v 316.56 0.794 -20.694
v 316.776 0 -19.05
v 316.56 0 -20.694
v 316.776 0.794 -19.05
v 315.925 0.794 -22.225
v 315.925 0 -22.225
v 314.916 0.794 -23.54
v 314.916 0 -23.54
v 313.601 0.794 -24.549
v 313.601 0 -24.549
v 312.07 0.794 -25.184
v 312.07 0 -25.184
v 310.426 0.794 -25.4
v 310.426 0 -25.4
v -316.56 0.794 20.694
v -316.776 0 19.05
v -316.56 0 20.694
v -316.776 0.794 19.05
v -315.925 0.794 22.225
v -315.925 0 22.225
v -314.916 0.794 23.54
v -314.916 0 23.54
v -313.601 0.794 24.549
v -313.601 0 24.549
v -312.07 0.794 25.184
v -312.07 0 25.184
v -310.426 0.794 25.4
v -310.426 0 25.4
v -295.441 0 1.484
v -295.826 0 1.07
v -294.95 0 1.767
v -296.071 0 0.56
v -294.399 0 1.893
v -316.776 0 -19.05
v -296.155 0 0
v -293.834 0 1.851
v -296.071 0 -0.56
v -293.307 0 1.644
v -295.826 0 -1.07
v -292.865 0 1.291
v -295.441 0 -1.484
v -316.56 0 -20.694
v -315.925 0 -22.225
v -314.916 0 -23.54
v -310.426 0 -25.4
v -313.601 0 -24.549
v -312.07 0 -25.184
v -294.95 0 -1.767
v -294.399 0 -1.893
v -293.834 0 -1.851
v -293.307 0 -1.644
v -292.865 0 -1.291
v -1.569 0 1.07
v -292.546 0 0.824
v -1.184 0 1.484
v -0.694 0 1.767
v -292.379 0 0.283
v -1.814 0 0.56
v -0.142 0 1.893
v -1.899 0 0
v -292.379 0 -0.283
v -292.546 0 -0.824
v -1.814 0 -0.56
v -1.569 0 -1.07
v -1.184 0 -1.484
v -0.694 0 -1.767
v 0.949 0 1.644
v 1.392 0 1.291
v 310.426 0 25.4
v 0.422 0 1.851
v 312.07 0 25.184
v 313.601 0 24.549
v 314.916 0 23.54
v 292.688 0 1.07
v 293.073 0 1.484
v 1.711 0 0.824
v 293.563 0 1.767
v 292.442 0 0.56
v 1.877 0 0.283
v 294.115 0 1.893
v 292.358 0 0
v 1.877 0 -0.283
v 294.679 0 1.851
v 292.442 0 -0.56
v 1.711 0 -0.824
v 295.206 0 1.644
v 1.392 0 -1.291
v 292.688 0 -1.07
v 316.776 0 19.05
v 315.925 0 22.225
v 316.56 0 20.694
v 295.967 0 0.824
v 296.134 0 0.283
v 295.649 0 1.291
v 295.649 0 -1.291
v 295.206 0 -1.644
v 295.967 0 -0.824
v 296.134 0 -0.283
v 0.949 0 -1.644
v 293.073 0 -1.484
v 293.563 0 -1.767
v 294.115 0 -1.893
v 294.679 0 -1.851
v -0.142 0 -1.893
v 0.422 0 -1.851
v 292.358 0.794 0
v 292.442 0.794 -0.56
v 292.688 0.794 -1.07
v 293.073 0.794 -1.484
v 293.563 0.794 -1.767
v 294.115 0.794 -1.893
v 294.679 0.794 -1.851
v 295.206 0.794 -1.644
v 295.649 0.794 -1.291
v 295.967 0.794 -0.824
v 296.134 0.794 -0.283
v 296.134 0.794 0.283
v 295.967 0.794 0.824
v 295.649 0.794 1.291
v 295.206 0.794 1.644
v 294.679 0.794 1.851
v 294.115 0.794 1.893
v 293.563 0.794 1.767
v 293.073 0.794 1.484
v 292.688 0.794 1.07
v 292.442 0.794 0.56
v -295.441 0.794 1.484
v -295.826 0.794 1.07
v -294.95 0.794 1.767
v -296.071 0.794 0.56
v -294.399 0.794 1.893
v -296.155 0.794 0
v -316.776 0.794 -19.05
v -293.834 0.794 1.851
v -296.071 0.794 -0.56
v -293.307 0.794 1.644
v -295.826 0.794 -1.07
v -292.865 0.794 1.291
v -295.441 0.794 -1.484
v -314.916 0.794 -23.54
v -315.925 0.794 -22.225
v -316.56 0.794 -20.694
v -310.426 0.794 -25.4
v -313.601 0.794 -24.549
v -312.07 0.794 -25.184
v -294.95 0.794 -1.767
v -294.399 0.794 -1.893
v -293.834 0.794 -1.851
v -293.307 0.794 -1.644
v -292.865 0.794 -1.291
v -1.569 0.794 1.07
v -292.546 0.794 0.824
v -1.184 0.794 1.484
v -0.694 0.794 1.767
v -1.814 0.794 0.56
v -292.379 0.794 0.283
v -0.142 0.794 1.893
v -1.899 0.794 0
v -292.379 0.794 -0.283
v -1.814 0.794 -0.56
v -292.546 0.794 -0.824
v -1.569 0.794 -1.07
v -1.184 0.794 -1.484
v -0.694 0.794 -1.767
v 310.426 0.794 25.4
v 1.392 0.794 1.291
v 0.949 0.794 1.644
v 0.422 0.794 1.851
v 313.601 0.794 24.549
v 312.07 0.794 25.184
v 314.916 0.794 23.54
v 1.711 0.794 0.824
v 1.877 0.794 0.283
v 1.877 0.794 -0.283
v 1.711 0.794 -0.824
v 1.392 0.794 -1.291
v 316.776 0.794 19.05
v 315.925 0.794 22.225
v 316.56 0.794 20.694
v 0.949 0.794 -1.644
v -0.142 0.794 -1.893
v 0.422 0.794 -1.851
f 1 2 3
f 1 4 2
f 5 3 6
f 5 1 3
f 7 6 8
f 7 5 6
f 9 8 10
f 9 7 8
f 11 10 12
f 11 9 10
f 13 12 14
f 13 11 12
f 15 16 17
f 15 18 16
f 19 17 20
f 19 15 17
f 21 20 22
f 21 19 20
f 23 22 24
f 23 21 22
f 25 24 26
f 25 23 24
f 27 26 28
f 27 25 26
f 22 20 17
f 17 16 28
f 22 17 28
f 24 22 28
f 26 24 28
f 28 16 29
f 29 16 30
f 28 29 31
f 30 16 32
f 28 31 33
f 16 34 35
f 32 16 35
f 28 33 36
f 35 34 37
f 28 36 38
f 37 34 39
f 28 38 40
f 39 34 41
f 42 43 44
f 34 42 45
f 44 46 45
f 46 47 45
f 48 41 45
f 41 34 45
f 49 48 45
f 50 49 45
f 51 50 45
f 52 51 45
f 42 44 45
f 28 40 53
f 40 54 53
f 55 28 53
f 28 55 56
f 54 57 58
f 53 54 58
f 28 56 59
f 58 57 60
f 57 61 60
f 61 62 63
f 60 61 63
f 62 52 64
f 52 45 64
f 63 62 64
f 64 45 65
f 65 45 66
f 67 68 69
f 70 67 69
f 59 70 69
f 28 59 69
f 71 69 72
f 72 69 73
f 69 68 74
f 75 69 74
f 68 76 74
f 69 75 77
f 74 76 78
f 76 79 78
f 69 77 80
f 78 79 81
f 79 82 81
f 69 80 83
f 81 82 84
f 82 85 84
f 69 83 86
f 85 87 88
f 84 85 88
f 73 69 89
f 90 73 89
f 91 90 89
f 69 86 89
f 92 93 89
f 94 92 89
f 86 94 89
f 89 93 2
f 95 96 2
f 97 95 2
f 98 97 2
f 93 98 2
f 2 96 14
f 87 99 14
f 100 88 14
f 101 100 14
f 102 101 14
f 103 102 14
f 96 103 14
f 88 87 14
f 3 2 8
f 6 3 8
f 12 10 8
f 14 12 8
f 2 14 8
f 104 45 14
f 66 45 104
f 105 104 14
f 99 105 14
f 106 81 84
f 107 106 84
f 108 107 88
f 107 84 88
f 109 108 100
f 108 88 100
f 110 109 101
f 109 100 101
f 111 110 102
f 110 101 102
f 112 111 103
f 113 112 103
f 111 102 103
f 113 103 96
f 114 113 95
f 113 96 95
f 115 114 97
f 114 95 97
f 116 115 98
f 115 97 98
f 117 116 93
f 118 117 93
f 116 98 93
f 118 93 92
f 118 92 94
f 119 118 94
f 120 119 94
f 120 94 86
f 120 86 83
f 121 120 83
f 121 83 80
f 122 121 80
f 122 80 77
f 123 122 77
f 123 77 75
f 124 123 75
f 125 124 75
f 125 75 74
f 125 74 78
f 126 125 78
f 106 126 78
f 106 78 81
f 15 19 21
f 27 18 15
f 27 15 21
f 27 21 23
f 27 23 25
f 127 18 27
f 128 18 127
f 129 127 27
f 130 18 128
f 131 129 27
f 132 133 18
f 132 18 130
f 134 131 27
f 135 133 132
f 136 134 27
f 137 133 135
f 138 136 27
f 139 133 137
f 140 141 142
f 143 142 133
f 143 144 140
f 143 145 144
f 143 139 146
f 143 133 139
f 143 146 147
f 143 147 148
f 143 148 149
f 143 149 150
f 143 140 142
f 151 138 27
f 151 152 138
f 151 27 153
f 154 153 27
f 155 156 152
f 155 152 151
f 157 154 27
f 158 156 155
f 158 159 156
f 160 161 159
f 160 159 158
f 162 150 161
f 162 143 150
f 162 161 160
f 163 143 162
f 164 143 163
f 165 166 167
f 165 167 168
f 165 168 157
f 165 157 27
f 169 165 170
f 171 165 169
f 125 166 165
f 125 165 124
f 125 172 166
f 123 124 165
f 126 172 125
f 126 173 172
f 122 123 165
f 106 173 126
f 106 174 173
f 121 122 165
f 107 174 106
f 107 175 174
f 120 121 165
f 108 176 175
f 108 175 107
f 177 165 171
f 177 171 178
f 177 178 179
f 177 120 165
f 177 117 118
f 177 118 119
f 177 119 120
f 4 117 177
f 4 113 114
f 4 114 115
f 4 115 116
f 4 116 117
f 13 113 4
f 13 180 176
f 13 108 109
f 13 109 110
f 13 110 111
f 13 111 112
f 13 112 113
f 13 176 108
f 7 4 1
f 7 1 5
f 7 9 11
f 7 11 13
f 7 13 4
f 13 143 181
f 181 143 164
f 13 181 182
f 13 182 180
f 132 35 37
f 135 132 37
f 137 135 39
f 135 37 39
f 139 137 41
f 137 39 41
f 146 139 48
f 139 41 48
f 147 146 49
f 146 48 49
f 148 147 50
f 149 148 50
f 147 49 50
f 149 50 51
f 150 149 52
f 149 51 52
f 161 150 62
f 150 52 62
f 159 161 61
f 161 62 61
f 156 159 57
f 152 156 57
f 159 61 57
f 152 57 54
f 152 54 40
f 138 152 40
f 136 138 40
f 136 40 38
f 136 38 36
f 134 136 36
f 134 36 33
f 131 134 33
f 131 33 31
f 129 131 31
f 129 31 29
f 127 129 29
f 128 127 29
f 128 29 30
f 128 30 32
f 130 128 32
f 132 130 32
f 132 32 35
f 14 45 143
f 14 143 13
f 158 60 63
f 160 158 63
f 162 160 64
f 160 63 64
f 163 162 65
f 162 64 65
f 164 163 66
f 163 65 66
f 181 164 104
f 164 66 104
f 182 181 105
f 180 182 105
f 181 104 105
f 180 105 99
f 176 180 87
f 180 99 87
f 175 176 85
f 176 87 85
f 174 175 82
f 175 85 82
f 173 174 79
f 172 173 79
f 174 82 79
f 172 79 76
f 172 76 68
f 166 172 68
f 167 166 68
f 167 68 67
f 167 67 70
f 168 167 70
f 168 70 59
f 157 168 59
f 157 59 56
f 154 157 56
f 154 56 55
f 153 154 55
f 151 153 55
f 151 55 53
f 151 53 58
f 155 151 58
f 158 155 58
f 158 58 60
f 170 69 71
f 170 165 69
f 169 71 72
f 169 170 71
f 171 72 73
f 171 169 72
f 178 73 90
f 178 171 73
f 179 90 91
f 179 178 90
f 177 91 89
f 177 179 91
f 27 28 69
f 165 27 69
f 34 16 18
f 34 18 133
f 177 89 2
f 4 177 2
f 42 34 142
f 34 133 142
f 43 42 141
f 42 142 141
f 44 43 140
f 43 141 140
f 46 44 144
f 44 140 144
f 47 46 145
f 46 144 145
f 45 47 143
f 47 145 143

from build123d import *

# Parameters (mm, degrees)
SKETCH1_W             = 633.5522
SKETCH1_H             = 50.8
BOSS_EXTRUDE1_DEPTH   = 0.79375
FILLET1_R             = 6.35
F_6_CLEARANCE_HOLE1_D = 3.7973


with BuildPart() as part:
    # Sketch1 → Boss-Extrude1 (new body)
    with BuildSketch(Plane(origin=(0, 0, 0), x_dir=(1, 0, 0), z_dir=(0, 1, 0))):
        Rectangle(SKETCH1_W, SKETCH1_H)
    extrude(amount=BOSS_EXTRUDE1_DEPTH)

    # Fillet1
    fillet1_edges = [part.edges().sort_by_distance(p)[0] for p in [
        (316.7761, 0.396875, 25.4),
        (-316.7761, 0.396875, 25.4),
        (-316.7761, 0.396875, -25.4),
        (316.7761, 0.396875, -25.4),
    ]]
    fillet(fillet1_edges, radius=FILLET1_R)

    # #6 Clearance Hole1 (through all)
    with Locations(Plane(origin=(0, 0.79375, 0), x_dir=(1, 0, 0), z_dir=(0, 1, 0))):
        with Locations((294.256791216, 0), (0, 0), (-294.256791216, 0)):
            Hole(F_6_CLEARANCE_HOLE1_D / 2)


solid = part.part
